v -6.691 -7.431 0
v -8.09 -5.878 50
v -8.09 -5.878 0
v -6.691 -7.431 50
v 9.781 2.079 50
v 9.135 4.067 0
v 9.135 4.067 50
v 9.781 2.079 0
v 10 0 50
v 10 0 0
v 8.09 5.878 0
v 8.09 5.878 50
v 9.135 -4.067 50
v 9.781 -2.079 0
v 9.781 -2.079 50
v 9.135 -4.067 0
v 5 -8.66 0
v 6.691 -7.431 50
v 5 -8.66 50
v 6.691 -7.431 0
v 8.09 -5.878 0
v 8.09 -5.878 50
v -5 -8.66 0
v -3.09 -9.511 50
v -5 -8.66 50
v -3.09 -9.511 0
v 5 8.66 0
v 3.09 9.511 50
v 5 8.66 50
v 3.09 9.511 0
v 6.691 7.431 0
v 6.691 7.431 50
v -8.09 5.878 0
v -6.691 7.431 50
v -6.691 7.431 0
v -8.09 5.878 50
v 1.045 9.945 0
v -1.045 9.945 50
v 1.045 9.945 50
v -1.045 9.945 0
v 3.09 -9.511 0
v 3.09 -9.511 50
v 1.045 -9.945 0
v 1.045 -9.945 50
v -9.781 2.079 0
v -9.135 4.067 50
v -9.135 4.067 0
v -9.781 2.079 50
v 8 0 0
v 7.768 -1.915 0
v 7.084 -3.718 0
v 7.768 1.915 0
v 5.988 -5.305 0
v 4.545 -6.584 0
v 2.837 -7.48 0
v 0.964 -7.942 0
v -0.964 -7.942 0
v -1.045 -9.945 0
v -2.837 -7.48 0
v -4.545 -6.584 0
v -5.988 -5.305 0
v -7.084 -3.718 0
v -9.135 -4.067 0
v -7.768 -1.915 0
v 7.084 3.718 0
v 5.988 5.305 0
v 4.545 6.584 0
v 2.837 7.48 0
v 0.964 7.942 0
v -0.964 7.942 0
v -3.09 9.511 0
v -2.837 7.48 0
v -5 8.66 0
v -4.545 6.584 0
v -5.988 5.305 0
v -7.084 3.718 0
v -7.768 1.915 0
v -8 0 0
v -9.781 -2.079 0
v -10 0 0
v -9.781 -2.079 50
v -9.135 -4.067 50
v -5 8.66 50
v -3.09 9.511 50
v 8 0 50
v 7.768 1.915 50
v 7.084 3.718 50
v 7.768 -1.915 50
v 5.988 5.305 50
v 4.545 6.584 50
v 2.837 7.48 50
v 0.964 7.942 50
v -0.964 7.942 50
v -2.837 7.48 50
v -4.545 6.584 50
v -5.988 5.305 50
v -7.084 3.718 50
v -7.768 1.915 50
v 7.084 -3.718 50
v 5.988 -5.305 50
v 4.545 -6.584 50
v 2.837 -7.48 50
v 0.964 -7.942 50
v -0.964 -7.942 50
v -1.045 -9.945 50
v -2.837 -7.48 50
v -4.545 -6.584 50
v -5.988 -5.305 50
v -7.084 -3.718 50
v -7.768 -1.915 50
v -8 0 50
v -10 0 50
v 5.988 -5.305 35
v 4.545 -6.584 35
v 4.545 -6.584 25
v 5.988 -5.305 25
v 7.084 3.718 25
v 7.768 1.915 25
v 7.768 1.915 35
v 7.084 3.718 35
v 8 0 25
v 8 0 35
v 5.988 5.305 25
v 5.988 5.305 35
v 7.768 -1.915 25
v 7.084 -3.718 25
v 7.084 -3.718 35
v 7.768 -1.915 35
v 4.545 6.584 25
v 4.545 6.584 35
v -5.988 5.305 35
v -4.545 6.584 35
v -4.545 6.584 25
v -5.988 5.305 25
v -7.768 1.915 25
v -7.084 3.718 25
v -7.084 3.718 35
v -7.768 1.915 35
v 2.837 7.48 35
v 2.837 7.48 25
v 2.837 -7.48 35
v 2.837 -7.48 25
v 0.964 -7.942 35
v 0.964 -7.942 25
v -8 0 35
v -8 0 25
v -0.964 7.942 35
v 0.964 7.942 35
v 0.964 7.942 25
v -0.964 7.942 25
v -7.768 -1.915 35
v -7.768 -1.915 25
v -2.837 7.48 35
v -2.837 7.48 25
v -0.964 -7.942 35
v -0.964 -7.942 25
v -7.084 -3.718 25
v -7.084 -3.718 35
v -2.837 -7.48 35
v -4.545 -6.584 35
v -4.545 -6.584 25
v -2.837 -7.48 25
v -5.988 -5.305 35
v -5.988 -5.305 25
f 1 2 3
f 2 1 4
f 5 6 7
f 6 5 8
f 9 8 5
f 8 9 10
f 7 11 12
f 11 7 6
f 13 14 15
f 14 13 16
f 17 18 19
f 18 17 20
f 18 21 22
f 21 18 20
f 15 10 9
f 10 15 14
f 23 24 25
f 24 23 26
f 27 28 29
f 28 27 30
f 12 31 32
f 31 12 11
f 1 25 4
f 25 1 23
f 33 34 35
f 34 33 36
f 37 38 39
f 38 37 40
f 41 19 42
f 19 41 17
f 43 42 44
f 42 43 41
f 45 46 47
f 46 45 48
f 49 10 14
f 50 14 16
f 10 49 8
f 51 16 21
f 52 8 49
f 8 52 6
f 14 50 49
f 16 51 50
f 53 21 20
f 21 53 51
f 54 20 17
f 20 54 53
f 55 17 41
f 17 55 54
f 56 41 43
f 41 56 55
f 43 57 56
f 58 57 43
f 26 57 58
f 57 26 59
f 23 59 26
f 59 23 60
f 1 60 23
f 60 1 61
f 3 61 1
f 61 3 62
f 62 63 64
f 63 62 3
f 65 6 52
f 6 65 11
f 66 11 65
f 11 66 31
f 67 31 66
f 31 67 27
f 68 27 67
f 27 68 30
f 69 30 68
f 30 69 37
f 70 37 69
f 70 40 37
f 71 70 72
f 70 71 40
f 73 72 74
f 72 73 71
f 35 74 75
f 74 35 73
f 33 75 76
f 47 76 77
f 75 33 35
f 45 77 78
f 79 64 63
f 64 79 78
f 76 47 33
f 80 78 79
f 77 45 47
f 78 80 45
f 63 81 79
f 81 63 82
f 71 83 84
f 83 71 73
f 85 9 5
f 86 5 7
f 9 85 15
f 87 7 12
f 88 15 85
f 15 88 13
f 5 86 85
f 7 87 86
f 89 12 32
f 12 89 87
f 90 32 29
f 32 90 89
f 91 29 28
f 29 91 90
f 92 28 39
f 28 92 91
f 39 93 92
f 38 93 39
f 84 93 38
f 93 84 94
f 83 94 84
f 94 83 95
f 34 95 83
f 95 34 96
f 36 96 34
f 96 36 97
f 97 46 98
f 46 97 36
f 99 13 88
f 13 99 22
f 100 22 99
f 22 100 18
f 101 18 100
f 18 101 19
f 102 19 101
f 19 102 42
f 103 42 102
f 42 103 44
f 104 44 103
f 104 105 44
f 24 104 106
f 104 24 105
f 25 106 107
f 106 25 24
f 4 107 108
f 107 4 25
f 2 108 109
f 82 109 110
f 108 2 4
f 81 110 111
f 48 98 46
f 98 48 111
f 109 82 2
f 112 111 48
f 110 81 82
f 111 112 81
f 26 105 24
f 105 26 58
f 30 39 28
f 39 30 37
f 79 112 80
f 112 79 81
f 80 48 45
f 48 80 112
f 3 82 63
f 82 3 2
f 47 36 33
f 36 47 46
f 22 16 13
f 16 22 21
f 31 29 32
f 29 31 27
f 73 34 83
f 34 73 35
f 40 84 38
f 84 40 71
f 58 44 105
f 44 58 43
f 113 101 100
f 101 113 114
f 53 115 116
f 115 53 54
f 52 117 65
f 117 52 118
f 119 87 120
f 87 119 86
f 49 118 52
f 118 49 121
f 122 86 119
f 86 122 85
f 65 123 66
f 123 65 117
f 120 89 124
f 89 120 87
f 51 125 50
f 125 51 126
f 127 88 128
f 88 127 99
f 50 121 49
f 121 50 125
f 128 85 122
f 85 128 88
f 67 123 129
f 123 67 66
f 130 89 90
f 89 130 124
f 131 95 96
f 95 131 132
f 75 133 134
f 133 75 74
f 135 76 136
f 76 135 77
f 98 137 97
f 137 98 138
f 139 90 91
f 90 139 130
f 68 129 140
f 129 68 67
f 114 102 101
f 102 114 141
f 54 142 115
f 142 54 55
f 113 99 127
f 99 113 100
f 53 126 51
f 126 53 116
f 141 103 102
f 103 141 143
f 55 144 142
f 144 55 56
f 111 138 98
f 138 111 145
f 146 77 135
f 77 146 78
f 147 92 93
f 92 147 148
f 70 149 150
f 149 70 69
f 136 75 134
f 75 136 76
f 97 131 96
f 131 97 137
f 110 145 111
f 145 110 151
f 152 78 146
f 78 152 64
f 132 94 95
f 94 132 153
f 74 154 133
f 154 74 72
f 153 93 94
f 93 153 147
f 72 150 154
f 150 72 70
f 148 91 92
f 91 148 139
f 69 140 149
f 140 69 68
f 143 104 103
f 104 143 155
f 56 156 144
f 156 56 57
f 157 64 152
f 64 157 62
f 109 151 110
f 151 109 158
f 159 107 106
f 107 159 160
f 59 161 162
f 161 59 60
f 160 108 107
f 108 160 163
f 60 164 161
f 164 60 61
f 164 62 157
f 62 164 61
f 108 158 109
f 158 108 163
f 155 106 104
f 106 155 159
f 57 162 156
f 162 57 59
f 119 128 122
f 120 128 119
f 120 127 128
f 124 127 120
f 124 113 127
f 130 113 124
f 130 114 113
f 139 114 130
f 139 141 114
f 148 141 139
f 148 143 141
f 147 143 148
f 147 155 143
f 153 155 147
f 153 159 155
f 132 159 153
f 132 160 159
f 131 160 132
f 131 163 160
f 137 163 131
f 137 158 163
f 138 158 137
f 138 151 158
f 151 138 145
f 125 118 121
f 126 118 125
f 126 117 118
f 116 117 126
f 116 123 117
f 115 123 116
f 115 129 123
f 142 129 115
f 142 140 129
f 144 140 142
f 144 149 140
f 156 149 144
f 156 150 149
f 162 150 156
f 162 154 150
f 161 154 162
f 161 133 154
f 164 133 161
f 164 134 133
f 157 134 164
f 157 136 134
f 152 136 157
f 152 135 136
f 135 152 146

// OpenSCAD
difference()
{
 cylinder(50,10,10);
cylinder (50,8,8);
}
#translate([0,0,25]) cylinder(10,8,8); 
